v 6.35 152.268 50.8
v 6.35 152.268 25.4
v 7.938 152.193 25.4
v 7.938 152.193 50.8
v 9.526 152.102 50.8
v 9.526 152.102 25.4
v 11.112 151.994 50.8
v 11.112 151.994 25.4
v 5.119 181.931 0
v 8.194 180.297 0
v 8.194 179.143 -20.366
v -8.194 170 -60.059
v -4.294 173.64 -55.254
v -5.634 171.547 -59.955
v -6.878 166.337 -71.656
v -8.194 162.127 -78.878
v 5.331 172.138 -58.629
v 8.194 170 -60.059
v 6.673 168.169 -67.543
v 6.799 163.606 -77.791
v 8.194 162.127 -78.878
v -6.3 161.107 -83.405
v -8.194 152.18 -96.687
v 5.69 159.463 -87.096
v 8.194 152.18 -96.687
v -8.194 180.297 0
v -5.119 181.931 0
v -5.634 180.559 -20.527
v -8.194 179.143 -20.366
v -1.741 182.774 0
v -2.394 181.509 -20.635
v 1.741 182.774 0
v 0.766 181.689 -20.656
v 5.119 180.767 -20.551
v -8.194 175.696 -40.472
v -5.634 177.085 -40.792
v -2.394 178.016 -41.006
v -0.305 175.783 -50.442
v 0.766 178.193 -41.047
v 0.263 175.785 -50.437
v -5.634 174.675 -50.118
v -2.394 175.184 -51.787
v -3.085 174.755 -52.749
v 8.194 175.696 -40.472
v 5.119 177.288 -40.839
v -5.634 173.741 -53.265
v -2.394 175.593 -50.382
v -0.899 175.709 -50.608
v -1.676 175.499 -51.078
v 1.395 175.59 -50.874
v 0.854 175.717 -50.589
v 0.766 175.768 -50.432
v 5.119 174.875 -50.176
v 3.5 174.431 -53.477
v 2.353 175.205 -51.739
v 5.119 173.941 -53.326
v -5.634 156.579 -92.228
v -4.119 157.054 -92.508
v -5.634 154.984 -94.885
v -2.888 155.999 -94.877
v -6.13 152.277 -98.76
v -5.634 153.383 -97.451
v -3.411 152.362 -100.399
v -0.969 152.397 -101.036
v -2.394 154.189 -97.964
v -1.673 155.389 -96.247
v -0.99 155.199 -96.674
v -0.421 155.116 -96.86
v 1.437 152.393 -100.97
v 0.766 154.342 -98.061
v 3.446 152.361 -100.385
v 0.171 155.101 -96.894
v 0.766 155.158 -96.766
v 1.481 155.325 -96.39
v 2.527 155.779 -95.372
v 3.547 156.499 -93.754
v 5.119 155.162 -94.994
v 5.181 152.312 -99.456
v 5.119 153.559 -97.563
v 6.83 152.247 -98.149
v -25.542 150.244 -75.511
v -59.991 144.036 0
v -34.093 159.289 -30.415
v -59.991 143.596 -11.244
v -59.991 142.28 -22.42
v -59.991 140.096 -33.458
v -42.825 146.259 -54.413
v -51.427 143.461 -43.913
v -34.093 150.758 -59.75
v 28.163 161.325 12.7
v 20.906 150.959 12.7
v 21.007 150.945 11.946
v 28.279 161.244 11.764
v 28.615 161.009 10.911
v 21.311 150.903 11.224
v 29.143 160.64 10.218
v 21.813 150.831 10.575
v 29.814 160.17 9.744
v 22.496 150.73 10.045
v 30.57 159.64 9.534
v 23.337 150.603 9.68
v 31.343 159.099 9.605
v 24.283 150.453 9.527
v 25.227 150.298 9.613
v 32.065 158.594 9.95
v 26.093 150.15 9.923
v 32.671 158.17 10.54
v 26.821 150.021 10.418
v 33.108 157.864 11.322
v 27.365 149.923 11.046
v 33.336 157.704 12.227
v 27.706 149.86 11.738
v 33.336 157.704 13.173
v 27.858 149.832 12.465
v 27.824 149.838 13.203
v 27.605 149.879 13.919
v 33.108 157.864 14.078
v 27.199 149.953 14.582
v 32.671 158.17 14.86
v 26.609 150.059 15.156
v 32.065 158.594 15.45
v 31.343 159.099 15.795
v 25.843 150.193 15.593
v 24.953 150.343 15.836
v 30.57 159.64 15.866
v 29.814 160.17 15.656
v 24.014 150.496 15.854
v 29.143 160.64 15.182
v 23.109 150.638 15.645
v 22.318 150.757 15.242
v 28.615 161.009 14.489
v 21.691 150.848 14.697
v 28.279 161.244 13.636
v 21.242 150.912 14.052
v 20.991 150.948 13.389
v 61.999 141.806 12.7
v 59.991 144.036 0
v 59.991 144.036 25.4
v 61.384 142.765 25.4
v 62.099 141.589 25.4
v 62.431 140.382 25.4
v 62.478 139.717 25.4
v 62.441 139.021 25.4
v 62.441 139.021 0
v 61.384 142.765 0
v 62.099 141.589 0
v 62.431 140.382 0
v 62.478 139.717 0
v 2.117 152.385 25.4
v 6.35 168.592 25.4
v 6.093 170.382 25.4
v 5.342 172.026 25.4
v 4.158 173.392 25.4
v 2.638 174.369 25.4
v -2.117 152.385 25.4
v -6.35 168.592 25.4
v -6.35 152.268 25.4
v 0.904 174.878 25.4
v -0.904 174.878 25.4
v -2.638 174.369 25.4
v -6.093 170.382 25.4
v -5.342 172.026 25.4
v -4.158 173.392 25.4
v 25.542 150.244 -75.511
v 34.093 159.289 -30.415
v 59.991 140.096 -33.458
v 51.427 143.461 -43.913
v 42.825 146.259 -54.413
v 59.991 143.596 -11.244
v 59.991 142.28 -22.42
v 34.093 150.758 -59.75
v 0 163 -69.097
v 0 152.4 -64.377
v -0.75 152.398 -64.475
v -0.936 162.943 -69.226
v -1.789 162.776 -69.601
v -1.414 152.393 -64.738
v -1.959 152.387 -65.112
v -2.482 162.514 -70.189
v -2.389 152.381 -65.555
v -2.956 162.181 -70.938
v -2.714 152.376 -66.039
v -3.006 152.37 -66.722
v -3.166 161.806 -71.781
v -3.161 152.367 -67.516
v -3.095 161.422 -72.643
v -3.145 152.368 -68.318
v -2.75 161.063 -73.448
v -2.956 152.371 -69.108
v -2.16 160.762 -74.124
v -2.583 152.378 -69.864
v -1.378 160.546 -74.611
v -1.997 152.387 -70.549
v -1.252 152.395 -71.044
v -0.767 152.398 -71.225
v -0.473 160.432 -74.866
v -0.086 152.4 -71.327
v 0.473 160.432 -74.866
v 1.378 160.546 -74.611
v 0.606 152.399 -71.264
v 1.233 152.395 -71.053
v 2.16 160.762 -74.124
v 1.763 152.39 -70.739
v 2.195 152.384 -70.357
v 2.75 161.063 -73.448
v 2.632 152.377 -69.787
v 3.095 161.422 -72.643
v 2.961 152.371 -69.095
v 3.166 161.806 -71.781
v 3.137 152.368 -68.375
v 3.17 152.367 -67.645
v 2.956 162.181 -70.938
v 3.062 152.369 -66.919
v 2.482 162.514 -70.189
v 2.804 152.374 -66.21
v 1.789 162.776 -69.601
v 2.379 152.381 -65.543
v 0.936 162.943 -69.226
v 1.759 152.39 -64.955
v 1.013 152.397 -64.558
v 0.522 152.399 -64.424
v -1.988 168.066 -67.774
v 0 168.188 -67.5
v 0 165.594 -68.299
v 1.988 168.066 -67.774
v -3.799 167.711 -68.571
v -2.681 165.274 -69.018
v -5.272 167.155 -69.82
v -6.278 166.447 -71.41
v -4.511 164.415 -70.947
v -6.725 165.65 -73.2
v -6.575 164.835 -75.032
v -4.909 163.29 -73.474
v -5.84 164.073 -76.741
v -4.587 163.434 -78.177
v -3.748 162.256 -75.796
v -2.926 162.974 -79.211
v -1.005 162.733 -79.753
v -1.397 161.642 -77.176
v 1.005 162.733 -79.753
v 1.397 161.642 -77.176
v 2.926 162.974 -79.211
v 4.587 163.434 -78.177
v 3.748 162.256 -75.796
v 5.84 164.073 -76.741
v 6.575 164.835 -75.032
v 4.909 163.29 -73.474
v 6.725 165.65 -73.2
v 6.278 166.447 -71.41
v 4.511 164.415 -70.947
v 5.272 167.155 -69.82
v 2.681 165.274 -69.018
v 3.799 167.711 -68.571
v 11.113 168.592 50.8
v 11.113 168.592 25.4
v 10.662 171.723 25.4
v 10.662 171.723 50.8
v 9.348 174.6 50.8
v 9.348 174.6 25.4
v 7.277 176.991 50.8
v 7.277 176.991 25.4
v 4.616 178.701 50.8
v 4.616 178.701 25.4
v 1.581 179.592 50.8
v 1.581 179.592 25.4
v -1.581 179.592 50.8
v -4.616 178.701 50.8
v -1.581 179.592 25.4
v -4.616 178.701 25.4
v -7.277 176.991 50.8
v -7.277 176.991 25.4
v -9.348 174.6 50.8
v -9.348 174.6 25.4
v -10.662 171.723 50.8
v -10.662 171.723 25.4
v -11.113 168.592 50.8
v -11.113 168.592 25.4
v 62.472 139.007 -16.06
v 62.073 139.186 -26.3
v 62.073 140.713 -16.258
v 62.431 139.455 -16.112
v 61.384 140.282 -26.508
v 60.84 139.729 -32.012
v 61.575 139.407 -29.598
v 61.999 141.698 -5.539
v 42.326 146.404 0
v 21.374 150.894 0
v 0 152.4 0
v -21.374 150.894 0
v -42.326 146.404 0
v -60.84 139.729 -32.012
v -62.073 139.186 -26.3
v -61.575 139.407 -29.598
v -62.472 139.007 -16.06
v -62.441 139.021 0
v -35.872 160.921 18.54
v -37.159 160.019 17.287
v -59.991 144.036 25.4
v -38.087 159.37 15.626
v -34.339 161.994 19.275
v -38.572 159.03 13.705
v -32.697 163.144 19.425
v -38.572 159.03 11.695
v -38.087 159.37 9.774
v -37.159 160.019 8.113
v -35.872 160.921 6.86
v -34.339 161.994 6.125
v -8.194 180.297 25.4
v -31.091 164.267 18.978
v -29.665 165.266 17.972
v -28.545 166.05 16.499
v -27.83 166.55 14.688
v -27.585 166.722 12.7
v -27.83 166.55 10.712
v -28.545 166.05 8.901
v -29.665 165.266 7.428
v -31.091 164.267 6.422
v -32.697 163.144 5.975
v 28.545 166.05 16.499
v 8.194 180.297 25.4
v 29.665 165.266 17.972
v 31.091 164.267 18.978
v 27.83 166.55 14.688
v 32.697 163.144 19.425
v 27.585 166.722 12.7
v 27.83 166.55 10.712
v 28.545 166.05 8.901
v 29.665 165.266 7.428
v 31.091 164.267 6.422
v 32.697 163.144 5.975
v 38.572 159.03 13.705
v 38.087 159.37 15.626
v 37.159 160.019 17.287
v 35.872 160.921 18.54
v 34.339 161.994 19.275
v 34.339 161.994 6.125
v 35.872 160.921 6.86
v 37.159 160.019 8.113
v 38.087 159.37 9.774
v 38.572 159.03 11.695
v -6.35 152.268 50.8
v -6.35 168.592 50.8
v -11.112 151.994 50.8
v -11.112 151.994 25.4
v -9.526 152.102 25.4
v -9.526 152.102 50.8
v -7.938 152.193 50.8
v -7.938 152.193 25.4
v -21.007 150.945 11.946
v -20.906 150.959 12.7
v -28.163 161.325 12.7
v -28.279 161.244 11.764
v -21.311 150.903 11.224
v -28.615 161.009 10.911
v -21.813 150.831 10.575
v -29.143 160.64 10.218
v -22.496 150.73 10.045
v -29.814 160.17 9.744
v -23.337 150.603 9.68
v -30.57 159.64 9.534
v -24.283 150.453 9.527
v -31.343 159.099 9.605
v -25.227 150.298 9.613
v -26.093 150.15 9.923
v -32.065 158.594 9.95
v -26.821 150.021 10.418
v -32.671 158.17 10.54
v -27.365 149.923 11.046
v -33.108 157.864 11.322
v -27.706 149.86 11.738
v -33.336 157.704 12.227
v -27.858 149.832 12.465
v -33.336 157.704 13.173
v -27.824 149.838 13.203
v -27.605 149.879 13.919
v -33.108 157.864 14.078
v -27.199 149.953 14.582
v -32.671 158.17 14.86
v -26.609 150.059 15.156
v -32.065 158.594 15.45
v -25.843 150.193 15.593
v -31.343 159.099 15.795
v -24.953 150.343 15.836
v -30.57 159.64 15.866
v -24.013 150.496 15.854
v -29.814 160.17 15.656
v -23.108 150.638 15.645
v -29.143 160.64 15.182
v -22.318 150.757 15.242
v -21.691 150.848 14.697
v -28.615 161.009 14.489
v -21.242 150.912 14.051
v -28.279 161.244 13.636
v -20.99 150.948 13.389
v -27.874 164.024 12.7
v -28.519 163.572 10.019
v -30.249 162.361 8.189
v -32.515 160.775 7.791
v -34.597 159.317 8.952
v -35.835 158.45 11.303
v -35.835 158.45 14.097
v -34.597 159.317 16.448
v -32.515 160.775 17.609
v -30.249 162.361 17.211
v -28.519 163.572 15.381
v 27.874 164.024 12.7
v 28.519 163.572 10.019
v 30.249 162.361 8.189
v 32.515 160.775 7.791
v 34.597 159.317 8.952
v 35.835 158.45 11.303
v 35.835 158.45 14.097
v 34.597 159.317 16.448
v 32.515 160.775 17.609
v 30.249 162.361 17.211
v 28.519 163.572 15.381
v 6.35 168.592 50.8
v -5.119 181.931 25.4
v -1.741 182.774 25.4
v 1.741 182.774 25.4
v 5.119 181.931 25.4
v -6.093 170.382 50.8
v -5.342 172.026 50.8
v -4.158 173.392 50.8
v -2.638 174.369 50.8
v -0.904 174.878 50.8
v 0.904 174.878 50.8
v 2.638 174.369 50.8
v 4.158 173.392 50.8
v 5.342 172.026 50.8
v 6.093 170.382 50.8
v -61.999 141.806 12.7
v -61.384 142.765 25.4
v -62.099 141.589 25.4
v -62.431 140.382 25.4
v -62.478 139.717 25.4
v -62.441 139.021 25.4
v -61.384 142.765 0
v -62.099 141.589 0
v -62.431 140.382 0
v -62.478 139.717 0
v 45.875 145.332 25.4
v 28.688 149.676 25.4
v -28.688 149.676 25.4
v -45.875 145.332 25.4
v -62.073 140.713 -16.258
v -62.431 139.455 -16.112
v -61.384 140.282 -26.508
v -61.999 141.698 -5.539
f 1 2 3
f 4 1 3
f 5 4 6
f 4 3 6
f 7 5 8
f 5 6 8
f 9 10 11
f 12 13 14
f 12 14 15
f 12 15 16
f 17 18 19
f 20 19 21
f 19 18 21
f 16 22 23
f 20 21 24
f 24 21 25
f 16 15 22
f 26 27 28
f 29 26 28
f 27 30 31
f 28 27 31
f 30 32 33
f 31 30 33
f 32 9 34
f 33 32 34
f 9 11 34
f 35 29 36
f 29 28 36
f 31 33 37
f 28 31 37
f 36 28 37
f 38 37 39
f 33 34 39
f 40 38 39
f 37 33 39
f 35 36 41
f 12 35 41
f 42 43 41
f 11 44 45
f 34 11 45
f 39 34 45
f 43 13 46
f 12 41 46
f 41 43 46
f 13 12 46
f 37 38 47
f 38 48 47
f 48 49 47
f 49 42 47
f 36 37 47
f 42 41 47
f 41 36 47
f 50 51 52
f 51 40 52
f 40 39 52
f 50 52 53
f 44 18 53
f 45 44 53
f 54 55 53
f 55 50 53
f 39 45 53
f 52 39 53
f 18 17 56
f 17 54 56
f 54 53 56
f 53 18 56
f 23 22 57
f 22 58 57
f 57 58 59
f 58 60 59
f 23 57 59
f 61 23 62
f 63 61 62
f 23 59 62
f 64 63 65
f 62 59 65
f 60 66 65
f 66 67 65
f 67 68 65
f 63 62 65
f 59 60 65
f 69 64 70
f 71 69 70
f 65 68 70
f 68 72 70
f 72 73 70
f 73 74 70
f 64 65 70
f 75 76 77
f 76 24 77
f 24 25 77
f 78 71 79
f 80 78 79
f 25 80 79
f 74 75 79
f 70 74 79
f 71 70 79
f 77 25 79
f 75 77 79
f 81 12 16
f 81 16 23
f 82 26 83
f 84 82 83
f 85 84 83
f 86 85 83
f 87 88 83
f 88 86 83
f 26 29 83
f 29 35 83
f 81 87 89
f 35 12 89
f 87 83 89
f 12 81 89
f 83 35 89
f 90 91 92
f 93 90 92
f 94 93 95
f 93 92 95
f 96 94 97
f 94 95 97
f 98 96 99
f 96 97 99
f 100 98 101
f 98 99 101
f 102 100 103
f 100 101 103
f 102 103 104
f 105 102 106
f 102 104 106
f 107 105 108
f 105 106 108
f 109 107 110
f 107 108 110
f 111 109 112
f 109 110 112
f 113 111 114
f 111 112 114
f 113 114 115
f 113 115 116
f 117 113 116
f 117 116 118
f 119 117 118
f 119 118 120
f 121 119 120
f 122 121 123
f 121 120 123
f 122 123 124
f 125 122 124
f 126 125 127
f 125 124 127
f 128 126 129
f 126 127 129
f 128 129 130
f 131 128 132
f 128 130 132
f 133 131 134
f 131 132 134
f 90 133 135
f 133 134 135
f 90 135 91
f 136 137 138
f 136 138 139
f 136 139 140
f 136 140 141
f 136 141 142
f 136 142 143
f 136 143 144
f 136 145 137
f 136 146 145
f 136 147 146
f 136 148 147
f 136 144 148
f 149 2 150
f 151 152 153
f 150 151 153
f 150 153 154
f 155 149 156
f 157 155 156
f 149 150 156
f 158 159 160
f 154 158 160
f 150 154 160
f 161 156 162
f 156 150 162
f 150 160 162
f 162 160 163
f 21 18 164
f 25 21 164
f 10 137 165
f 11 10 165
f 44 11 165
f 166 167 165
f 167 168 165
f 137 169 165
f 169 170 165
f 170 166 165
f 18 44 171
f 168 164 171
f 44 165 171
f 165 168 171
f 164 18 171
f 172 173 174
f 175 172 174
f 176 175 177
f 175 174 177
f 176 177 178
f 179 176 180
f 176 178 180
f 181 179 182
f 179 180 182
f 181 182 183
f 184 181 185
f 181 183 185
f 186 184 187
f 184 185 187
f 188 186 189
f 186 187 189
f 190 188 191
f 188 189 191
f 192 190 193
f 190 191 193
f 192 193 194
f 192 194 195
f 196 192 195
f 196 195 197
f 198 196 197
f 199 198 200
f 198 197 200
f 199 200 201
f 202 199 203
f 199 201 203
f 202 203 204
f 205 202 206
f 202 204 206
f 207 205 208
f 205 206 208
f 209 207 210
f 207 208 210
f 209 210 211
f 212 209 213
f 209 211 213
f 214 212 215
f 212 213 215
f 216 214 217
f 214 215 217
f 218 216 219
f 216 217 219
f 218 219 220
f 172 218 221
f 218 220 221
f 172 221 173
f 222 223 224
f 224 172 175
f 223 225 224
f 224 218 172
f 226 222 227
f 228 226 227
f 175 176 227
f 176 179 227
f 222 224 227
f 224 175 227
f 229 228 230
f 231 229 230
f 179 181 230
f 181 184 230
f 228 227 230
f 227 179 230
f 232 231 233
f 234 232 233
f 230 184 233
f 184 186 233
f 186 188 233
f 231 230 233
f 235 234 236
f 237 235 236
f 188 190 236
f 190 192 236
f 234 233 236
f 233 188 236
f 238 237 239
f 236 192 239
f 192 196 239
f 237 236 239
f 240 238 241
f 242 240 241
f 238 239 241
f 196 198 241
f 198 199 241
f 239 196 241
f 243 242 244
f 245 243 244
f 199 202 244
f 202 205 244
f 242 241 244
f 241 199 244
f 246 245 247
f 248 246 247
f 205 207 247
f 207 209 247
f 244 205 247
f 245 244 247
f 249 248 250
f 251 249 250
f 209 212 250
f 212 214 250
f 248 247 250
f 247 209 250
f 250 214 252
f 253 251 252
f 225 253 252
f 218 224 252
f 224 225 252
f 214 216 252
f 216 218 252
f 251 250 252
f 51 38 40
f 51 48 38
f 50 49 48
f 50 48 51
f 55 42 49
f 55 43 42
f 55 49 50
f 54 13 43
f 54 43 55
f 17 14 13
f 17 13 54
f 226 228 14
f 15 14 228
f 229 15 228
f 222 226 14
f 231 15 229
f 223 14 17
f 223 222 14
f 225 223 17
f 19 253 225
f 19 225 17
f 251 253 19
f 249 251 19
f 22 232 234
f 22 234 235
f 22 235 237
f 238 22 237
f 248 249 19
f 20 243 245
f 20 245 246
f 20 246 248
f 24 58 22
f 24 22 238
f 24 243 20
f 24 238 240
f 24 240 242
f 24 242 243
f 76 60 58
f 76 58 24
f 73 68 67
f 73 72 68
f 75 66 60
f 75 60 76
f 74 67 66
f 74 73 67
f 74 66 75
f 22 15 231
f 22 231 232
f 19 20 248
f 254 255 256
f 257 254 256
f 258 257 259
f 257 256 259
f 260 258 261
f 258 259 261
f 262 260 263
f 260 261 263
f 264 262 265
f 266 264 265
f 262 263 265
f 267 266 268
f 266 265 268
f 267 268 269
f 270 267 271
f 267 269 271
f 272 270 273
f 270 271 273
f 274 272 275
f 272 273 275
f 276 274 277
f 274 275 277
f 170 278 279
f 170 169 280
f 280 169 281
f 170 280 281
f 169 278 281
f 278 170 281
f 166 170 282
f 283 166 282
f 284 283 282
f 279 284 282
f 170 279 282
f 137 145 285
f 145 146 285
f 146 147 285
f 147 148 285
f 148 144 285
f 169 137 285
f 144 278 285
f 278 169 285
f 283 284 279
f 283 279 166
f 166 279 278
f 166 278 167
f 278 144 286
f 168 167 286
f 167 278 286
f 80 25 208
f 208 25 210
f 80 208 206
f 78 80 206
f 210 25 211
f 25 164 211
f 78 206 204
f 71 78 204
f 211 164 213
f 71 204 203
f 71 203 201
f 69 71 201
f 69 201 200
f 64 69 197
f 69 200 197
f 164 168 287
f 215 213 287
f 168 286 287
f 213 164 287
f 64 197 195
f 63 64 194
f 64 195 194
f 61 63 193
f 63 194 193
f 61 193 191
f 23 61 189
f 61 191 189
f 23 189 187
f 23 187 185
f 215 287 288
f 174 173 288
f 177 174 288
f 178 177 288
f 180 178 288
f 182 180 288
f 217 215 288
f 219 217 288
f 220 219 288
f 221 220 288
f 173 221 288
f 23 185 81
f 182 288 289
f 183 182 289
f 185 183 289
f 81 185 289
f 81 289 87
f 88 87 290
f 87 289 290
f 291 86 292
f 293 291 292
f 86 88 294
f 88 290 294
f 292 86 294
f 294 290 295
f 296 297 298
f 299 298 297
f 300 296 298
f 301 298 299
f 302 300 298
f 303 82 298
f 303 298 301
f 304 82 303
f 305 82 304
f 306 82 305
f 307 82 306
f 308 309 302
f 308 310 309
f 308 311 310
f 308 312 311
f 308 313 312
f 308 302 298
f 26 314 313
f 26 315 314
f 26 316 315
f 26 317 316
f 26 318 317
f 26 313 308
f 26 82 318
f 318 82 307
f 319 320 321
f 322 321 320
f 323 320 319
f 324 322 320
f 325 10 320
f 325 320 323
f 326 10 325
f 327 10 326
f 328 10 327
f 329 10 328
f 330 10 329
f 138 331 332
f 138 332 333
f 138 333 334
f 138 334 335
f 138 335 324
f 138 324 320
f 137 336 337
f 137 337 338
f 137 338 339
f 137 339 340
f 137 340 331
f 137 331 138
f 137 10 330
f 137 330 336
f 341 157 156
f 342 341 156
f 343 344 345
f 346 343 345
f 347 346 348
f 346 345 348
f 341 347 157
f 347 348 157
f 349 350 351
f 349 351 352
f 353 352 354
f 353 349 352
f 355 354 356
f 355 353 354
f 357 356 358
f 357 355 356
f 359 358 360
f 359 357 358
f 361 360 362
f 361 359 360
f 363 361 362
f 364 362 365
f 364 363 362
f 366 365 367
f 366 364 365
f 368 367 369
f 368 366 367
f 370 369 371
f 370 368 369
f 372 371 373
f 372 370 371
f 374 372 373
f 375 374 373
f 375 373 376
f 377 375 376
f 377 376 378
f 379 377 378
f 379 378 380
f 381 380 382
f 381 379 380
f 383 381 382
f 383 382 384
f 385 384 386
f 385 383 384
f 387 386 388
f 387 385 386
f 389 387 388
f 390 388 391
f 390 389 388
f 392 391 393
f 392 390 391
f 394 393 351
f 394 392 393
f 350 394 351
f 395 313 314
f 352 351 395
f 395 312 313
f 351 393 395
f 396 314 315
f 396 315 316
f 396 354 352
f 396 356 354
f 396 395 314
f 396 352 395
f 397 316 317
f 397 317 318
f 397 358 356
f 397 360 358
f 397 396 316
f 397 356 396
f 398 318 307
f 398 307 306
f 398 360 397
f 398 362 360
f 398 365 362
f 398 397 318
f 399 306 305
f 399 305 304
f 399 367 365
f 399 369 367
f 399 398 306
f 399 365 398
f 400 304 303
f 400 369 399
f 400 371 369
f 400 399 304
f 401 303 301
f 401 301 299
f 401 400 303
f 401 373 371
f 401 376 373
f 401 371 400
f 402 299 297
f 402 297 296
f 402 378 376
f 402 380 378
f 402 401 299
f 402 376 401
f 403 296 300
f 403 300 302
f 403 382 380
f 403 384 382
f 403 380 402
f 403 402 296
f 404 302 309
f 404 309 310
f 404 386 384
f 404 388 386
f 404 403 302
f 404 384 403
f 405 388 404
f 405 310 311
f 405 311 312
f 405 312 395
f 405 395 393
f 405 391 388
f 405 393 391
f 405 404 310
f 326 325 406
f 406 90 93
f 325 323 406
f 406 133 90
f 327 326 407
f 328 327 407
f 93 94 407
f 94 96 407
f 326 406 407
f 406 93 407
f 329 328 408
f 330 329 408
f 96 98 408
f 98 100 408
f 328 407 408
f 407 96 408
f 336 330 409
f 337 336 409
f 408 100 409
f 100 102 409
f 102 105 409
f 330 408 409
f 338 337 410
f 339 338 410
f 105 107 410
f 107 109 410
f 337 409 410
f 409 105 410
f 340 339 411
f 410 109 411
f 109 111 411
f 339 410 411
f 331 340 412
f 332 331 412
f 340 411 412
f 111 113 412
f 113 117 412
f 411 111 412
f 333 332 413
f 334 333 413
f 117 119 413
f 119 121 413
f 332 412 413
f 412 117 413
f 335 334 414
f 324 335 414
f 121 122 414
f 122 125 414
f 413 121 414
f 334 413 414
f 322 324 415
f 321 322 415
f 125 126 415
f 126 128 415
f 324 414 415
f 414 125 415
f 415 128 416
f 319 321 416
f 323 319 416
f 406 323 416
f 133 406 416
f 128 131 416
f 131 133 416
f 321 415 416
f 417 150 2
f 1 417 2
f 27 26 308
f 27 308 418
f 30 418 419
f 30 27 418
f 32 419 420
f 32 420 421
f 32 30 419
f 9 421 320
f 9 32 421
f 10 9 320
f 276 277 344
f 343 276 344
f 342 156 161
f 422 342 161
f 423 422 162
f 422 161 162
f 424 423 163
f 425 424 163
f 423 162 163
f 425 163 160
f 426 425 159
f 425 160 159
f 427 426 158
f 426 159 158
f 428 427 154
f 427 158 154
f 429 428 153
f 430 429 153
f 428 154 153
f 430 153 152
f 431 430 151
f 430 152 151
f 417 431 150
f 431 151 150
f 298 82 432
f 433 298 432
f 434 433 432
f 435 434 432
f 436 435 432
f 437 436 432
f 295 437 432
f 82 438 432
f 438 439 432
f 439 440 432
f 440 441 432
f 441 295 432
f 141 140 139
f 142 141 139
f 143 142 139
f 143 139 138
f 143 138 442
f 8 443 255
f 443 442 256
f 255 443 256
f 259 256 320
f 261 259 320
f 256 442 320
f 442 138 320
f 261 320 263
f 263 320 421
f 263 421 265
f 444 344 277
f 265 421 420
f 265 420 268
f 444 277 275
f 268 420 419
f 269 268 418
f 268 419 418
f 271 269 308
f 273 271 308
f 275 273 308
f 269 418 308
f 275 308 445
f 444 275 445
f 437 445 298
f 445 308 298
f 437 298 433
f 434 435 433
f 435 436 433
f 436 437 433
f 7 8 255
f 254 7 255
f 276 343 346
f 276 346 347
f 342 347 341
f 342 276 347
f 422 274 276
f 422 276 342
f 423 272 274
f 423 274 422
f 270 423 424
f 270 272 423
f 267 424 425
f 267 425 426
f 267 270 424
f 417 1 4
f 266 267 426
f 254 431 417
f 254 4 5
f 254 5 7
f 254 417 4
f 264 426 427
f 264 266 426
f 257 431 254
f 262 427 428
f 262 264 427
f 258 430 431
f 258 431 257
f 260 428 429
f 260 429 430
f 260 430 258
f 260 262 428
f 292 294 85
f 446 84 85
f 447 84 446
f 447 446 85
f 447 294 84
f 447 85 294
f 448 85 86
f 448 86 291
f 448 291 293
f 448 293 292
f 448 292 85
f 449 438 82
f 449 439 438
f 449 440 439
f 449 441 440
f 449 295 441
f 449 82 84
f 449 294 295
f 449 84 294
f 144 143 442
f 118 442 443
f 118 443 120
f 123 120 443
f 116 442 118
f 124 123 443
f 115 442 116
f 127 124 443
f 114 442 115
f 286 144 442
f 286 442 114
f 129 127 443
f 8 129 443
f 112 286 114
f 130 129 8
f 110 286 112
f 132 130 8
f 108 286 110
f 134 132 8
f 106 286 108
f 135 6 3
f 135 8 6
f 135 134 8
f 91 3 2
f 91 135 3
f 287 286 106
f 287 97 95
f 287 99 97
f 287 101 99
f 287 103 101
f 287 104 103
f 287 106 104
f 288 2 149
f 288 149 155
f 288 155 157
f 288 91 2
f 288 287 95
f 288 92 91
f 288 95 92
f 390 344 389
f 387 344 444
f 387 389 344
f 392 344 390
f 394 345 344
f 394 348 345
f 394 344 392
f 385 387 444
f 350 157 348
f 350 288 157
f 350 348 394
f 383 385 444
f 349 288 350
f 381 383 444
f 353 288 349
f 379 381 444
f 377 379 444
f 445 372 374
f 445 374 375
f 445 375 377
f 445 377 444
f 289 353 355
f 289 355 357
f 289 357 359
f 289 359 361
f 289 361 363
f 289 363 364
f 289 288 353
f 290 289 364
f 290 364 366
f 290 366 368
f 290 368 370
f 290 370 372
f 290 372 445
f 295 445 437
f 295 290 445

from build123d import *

# Parameters (mm, degrees)
REVOLVE1_ANGLE      = 57
BOSS_EXTRUDE1_DEPTH = 25.4
SKETCH8_R           = 152.4
CUT_EXTRUDE3_DEPTH  = 257.048
SKETCH13_W          = 16.387620484
SKETCH13_H          = 127
CUT_EXTRUDE5_DEPTH  = 1.778
BOSS_EXTRUDE3_DEPTH = 25.4


with BuildPart() as part:
    # Sketch1 → Revolve1 (revolve)
    with BuildSketch(Plane.XY):
        with BuildLine():
            Line((-59.991213716, 144.035687339), (-8.193810242, 180.296949153))
            ThreePointArc((-8.193810242, 180.296949153), (0, 182.88), (8.193810242, 180.296949153))
            Line((8.193810242, 180.296949153), (59.991213716, 144.035687339))
            add(Edge.make_bspline(
                [(59.991213716, 144.035687339), (62.78248672, 142.0840471), (62.441206007, 139.021062406)],
                knots=[0, 0, 0, 1, 1, 1], degree=2))
            ThreePointArc((62.441206007, 139.021062406), (0, 152.4), (-62.441206007, 139.021062406))
            add(Edge.make_bspline(
                [(-59.991213716, 144.035687339), (-62.78248672, 142.0840471), (-62.441206007, 139.021062406)],
                knots=[0, 0, 0, 1, 1, 1], degree=2))
        make_face()
    revolve(axis=Axis((0, 0, 0), (-1, 0, 0)), revolution_arc=REVOLVE1_ANGLE)

    # Sketch3 → Boss-Extrude1 (add)
    with BuildSketch(Plane.XY):
        with BuildLine():
            Line((-59.991213716, 144.035687339), (-8.193810242, 180.296949153))
            ThreePointArc((-8.193810242, 180.296949153), (0, 182.88), (8.193810242, 180.296949153))
            Line((8.193810242, 180.296949153), (59.991213716, 144.035687339))
            add(Edge.make_bspline(
                [(59.991213716, 144.035687339), (62.782486262, 142.084047002), (62.441206007, 139.021062406)],
                knots=[0, 0, 0, 1, 1, 1], degree=2))
            ThreePointArc((62.441206007, 139.021062406), (0, 152.4), (-62.441206007, 139.021062406))
            add(Edge.make_bspline(
                [(-59.991213716, 144.035687339), (-62.782486262, 142.084047002), (-62.441206007, 139.021062406)],
                knots=[0, 0, 0, 1, 1, 1], degree=2))
        make_face()
    extrude(amount=BOSS_EXTRUDE1_DEPTH)

    # Sketch7 → Cut-Revolve2 (revolve, cut)
    with BuildSketch(Plane.XY.offset(12.7)):
        Polygon((-18.85509192, 148.029004366), (-21.456080621, 146.208157646), (-33.109499632, 162.854485329), (-27.584999632, 166.721963764), (-28.163260355, 161.325258604), align=None)
    cut_revolve2 = revolve(axis=Axis((-21.456080621, 146.208157646, 12.7), (-0.57349503, 0.81920904, 0)), mode=Mode.SUBTRACT)

    # Mirror2: Cut-Revolve2 across plane
    add(cut_revolve2.mirror(Plane(origin=(0, 0, 0), x_dir=(0, 0, 1), z_dir=(1, 0, 0))), mode=Mode.SUBTRACT)

    # Sketch8 → Cut-Extrude3 (cut)
    with BuildSketch(Plane.XY.offset(25.4)):
        Circle(SKETCH8_R)
    extrude(amount=-CUT_EXTRUDE3_DEPTH, mode=Mode.SUBTRACT)

    # Sketch13 → Cut-Extrude5 (cut)
    with BuildSketch(Plane(origin=(0, 167.069193294, -74.383997286), x_dir=(1, 0, 0), z_dir=(0, 0.913545458, -0.406736643))):
        Rectangle(SKETCH13_W, SKETCH13_H)
    extrude(amount=-CUT_EXTRUDE5_DEPTH, mode=Mode.SUBTRACT)

    # Sketch14 → Cut-Revolve4 (revolve, cut)
    with BuildSketch(Plane(origin=(0, 0, 0), x_dir=(0, 0, -1), z_dir=(1, 0, 0))):
        Polygon((73.660819534, 165.44490947), (67.500143032, 168.18781937), (69.097003878, 163.000445517), (60.429201972, 143.532243688), (63.3297088, 142.240854846), align=None)
    revolve(axis=Axis((0, 165.44490947, -73.660819534), (0, -0.913545458, 0.406736643)), mode=Mode.SUBTRACT)

    # Sketch15 → Boss-Extrude3 (add)
    with BuildSketch(Plane.XY.offset(25.4)):
        with BuildLine():
            Line((-11.1125, 168.5925), (-11.1125, 151.994316814))
            ThreePointArc((-11.1125, 151.994316814), (-8.732319534, 152.149619111), (-6.35, 152.267650865))
            Line((-6.35, 152.267650865), (-6.35, 168.5925))
            ThreePointArc((-6.35, 168.5925), (0, 174.9425), (6.35, 168.5925))
            Line((6.35, 168.5925), (6.35, 152.267650865))
            ThreePointArc((6.35, 152.267650865), (8.732319534, 152.149619111), (11.1125, 151.994316814))
            Line((11.1125, 151.994316814), (11.1125, 168.5925))
            ThreePointArc((11.1125, 168.5925), (0, 179.705), (-11.1125, 168.5925))
        make_face()
    extrude(amount=BOSS_EXTRUDE3_DEPTH)


solid = part.part
